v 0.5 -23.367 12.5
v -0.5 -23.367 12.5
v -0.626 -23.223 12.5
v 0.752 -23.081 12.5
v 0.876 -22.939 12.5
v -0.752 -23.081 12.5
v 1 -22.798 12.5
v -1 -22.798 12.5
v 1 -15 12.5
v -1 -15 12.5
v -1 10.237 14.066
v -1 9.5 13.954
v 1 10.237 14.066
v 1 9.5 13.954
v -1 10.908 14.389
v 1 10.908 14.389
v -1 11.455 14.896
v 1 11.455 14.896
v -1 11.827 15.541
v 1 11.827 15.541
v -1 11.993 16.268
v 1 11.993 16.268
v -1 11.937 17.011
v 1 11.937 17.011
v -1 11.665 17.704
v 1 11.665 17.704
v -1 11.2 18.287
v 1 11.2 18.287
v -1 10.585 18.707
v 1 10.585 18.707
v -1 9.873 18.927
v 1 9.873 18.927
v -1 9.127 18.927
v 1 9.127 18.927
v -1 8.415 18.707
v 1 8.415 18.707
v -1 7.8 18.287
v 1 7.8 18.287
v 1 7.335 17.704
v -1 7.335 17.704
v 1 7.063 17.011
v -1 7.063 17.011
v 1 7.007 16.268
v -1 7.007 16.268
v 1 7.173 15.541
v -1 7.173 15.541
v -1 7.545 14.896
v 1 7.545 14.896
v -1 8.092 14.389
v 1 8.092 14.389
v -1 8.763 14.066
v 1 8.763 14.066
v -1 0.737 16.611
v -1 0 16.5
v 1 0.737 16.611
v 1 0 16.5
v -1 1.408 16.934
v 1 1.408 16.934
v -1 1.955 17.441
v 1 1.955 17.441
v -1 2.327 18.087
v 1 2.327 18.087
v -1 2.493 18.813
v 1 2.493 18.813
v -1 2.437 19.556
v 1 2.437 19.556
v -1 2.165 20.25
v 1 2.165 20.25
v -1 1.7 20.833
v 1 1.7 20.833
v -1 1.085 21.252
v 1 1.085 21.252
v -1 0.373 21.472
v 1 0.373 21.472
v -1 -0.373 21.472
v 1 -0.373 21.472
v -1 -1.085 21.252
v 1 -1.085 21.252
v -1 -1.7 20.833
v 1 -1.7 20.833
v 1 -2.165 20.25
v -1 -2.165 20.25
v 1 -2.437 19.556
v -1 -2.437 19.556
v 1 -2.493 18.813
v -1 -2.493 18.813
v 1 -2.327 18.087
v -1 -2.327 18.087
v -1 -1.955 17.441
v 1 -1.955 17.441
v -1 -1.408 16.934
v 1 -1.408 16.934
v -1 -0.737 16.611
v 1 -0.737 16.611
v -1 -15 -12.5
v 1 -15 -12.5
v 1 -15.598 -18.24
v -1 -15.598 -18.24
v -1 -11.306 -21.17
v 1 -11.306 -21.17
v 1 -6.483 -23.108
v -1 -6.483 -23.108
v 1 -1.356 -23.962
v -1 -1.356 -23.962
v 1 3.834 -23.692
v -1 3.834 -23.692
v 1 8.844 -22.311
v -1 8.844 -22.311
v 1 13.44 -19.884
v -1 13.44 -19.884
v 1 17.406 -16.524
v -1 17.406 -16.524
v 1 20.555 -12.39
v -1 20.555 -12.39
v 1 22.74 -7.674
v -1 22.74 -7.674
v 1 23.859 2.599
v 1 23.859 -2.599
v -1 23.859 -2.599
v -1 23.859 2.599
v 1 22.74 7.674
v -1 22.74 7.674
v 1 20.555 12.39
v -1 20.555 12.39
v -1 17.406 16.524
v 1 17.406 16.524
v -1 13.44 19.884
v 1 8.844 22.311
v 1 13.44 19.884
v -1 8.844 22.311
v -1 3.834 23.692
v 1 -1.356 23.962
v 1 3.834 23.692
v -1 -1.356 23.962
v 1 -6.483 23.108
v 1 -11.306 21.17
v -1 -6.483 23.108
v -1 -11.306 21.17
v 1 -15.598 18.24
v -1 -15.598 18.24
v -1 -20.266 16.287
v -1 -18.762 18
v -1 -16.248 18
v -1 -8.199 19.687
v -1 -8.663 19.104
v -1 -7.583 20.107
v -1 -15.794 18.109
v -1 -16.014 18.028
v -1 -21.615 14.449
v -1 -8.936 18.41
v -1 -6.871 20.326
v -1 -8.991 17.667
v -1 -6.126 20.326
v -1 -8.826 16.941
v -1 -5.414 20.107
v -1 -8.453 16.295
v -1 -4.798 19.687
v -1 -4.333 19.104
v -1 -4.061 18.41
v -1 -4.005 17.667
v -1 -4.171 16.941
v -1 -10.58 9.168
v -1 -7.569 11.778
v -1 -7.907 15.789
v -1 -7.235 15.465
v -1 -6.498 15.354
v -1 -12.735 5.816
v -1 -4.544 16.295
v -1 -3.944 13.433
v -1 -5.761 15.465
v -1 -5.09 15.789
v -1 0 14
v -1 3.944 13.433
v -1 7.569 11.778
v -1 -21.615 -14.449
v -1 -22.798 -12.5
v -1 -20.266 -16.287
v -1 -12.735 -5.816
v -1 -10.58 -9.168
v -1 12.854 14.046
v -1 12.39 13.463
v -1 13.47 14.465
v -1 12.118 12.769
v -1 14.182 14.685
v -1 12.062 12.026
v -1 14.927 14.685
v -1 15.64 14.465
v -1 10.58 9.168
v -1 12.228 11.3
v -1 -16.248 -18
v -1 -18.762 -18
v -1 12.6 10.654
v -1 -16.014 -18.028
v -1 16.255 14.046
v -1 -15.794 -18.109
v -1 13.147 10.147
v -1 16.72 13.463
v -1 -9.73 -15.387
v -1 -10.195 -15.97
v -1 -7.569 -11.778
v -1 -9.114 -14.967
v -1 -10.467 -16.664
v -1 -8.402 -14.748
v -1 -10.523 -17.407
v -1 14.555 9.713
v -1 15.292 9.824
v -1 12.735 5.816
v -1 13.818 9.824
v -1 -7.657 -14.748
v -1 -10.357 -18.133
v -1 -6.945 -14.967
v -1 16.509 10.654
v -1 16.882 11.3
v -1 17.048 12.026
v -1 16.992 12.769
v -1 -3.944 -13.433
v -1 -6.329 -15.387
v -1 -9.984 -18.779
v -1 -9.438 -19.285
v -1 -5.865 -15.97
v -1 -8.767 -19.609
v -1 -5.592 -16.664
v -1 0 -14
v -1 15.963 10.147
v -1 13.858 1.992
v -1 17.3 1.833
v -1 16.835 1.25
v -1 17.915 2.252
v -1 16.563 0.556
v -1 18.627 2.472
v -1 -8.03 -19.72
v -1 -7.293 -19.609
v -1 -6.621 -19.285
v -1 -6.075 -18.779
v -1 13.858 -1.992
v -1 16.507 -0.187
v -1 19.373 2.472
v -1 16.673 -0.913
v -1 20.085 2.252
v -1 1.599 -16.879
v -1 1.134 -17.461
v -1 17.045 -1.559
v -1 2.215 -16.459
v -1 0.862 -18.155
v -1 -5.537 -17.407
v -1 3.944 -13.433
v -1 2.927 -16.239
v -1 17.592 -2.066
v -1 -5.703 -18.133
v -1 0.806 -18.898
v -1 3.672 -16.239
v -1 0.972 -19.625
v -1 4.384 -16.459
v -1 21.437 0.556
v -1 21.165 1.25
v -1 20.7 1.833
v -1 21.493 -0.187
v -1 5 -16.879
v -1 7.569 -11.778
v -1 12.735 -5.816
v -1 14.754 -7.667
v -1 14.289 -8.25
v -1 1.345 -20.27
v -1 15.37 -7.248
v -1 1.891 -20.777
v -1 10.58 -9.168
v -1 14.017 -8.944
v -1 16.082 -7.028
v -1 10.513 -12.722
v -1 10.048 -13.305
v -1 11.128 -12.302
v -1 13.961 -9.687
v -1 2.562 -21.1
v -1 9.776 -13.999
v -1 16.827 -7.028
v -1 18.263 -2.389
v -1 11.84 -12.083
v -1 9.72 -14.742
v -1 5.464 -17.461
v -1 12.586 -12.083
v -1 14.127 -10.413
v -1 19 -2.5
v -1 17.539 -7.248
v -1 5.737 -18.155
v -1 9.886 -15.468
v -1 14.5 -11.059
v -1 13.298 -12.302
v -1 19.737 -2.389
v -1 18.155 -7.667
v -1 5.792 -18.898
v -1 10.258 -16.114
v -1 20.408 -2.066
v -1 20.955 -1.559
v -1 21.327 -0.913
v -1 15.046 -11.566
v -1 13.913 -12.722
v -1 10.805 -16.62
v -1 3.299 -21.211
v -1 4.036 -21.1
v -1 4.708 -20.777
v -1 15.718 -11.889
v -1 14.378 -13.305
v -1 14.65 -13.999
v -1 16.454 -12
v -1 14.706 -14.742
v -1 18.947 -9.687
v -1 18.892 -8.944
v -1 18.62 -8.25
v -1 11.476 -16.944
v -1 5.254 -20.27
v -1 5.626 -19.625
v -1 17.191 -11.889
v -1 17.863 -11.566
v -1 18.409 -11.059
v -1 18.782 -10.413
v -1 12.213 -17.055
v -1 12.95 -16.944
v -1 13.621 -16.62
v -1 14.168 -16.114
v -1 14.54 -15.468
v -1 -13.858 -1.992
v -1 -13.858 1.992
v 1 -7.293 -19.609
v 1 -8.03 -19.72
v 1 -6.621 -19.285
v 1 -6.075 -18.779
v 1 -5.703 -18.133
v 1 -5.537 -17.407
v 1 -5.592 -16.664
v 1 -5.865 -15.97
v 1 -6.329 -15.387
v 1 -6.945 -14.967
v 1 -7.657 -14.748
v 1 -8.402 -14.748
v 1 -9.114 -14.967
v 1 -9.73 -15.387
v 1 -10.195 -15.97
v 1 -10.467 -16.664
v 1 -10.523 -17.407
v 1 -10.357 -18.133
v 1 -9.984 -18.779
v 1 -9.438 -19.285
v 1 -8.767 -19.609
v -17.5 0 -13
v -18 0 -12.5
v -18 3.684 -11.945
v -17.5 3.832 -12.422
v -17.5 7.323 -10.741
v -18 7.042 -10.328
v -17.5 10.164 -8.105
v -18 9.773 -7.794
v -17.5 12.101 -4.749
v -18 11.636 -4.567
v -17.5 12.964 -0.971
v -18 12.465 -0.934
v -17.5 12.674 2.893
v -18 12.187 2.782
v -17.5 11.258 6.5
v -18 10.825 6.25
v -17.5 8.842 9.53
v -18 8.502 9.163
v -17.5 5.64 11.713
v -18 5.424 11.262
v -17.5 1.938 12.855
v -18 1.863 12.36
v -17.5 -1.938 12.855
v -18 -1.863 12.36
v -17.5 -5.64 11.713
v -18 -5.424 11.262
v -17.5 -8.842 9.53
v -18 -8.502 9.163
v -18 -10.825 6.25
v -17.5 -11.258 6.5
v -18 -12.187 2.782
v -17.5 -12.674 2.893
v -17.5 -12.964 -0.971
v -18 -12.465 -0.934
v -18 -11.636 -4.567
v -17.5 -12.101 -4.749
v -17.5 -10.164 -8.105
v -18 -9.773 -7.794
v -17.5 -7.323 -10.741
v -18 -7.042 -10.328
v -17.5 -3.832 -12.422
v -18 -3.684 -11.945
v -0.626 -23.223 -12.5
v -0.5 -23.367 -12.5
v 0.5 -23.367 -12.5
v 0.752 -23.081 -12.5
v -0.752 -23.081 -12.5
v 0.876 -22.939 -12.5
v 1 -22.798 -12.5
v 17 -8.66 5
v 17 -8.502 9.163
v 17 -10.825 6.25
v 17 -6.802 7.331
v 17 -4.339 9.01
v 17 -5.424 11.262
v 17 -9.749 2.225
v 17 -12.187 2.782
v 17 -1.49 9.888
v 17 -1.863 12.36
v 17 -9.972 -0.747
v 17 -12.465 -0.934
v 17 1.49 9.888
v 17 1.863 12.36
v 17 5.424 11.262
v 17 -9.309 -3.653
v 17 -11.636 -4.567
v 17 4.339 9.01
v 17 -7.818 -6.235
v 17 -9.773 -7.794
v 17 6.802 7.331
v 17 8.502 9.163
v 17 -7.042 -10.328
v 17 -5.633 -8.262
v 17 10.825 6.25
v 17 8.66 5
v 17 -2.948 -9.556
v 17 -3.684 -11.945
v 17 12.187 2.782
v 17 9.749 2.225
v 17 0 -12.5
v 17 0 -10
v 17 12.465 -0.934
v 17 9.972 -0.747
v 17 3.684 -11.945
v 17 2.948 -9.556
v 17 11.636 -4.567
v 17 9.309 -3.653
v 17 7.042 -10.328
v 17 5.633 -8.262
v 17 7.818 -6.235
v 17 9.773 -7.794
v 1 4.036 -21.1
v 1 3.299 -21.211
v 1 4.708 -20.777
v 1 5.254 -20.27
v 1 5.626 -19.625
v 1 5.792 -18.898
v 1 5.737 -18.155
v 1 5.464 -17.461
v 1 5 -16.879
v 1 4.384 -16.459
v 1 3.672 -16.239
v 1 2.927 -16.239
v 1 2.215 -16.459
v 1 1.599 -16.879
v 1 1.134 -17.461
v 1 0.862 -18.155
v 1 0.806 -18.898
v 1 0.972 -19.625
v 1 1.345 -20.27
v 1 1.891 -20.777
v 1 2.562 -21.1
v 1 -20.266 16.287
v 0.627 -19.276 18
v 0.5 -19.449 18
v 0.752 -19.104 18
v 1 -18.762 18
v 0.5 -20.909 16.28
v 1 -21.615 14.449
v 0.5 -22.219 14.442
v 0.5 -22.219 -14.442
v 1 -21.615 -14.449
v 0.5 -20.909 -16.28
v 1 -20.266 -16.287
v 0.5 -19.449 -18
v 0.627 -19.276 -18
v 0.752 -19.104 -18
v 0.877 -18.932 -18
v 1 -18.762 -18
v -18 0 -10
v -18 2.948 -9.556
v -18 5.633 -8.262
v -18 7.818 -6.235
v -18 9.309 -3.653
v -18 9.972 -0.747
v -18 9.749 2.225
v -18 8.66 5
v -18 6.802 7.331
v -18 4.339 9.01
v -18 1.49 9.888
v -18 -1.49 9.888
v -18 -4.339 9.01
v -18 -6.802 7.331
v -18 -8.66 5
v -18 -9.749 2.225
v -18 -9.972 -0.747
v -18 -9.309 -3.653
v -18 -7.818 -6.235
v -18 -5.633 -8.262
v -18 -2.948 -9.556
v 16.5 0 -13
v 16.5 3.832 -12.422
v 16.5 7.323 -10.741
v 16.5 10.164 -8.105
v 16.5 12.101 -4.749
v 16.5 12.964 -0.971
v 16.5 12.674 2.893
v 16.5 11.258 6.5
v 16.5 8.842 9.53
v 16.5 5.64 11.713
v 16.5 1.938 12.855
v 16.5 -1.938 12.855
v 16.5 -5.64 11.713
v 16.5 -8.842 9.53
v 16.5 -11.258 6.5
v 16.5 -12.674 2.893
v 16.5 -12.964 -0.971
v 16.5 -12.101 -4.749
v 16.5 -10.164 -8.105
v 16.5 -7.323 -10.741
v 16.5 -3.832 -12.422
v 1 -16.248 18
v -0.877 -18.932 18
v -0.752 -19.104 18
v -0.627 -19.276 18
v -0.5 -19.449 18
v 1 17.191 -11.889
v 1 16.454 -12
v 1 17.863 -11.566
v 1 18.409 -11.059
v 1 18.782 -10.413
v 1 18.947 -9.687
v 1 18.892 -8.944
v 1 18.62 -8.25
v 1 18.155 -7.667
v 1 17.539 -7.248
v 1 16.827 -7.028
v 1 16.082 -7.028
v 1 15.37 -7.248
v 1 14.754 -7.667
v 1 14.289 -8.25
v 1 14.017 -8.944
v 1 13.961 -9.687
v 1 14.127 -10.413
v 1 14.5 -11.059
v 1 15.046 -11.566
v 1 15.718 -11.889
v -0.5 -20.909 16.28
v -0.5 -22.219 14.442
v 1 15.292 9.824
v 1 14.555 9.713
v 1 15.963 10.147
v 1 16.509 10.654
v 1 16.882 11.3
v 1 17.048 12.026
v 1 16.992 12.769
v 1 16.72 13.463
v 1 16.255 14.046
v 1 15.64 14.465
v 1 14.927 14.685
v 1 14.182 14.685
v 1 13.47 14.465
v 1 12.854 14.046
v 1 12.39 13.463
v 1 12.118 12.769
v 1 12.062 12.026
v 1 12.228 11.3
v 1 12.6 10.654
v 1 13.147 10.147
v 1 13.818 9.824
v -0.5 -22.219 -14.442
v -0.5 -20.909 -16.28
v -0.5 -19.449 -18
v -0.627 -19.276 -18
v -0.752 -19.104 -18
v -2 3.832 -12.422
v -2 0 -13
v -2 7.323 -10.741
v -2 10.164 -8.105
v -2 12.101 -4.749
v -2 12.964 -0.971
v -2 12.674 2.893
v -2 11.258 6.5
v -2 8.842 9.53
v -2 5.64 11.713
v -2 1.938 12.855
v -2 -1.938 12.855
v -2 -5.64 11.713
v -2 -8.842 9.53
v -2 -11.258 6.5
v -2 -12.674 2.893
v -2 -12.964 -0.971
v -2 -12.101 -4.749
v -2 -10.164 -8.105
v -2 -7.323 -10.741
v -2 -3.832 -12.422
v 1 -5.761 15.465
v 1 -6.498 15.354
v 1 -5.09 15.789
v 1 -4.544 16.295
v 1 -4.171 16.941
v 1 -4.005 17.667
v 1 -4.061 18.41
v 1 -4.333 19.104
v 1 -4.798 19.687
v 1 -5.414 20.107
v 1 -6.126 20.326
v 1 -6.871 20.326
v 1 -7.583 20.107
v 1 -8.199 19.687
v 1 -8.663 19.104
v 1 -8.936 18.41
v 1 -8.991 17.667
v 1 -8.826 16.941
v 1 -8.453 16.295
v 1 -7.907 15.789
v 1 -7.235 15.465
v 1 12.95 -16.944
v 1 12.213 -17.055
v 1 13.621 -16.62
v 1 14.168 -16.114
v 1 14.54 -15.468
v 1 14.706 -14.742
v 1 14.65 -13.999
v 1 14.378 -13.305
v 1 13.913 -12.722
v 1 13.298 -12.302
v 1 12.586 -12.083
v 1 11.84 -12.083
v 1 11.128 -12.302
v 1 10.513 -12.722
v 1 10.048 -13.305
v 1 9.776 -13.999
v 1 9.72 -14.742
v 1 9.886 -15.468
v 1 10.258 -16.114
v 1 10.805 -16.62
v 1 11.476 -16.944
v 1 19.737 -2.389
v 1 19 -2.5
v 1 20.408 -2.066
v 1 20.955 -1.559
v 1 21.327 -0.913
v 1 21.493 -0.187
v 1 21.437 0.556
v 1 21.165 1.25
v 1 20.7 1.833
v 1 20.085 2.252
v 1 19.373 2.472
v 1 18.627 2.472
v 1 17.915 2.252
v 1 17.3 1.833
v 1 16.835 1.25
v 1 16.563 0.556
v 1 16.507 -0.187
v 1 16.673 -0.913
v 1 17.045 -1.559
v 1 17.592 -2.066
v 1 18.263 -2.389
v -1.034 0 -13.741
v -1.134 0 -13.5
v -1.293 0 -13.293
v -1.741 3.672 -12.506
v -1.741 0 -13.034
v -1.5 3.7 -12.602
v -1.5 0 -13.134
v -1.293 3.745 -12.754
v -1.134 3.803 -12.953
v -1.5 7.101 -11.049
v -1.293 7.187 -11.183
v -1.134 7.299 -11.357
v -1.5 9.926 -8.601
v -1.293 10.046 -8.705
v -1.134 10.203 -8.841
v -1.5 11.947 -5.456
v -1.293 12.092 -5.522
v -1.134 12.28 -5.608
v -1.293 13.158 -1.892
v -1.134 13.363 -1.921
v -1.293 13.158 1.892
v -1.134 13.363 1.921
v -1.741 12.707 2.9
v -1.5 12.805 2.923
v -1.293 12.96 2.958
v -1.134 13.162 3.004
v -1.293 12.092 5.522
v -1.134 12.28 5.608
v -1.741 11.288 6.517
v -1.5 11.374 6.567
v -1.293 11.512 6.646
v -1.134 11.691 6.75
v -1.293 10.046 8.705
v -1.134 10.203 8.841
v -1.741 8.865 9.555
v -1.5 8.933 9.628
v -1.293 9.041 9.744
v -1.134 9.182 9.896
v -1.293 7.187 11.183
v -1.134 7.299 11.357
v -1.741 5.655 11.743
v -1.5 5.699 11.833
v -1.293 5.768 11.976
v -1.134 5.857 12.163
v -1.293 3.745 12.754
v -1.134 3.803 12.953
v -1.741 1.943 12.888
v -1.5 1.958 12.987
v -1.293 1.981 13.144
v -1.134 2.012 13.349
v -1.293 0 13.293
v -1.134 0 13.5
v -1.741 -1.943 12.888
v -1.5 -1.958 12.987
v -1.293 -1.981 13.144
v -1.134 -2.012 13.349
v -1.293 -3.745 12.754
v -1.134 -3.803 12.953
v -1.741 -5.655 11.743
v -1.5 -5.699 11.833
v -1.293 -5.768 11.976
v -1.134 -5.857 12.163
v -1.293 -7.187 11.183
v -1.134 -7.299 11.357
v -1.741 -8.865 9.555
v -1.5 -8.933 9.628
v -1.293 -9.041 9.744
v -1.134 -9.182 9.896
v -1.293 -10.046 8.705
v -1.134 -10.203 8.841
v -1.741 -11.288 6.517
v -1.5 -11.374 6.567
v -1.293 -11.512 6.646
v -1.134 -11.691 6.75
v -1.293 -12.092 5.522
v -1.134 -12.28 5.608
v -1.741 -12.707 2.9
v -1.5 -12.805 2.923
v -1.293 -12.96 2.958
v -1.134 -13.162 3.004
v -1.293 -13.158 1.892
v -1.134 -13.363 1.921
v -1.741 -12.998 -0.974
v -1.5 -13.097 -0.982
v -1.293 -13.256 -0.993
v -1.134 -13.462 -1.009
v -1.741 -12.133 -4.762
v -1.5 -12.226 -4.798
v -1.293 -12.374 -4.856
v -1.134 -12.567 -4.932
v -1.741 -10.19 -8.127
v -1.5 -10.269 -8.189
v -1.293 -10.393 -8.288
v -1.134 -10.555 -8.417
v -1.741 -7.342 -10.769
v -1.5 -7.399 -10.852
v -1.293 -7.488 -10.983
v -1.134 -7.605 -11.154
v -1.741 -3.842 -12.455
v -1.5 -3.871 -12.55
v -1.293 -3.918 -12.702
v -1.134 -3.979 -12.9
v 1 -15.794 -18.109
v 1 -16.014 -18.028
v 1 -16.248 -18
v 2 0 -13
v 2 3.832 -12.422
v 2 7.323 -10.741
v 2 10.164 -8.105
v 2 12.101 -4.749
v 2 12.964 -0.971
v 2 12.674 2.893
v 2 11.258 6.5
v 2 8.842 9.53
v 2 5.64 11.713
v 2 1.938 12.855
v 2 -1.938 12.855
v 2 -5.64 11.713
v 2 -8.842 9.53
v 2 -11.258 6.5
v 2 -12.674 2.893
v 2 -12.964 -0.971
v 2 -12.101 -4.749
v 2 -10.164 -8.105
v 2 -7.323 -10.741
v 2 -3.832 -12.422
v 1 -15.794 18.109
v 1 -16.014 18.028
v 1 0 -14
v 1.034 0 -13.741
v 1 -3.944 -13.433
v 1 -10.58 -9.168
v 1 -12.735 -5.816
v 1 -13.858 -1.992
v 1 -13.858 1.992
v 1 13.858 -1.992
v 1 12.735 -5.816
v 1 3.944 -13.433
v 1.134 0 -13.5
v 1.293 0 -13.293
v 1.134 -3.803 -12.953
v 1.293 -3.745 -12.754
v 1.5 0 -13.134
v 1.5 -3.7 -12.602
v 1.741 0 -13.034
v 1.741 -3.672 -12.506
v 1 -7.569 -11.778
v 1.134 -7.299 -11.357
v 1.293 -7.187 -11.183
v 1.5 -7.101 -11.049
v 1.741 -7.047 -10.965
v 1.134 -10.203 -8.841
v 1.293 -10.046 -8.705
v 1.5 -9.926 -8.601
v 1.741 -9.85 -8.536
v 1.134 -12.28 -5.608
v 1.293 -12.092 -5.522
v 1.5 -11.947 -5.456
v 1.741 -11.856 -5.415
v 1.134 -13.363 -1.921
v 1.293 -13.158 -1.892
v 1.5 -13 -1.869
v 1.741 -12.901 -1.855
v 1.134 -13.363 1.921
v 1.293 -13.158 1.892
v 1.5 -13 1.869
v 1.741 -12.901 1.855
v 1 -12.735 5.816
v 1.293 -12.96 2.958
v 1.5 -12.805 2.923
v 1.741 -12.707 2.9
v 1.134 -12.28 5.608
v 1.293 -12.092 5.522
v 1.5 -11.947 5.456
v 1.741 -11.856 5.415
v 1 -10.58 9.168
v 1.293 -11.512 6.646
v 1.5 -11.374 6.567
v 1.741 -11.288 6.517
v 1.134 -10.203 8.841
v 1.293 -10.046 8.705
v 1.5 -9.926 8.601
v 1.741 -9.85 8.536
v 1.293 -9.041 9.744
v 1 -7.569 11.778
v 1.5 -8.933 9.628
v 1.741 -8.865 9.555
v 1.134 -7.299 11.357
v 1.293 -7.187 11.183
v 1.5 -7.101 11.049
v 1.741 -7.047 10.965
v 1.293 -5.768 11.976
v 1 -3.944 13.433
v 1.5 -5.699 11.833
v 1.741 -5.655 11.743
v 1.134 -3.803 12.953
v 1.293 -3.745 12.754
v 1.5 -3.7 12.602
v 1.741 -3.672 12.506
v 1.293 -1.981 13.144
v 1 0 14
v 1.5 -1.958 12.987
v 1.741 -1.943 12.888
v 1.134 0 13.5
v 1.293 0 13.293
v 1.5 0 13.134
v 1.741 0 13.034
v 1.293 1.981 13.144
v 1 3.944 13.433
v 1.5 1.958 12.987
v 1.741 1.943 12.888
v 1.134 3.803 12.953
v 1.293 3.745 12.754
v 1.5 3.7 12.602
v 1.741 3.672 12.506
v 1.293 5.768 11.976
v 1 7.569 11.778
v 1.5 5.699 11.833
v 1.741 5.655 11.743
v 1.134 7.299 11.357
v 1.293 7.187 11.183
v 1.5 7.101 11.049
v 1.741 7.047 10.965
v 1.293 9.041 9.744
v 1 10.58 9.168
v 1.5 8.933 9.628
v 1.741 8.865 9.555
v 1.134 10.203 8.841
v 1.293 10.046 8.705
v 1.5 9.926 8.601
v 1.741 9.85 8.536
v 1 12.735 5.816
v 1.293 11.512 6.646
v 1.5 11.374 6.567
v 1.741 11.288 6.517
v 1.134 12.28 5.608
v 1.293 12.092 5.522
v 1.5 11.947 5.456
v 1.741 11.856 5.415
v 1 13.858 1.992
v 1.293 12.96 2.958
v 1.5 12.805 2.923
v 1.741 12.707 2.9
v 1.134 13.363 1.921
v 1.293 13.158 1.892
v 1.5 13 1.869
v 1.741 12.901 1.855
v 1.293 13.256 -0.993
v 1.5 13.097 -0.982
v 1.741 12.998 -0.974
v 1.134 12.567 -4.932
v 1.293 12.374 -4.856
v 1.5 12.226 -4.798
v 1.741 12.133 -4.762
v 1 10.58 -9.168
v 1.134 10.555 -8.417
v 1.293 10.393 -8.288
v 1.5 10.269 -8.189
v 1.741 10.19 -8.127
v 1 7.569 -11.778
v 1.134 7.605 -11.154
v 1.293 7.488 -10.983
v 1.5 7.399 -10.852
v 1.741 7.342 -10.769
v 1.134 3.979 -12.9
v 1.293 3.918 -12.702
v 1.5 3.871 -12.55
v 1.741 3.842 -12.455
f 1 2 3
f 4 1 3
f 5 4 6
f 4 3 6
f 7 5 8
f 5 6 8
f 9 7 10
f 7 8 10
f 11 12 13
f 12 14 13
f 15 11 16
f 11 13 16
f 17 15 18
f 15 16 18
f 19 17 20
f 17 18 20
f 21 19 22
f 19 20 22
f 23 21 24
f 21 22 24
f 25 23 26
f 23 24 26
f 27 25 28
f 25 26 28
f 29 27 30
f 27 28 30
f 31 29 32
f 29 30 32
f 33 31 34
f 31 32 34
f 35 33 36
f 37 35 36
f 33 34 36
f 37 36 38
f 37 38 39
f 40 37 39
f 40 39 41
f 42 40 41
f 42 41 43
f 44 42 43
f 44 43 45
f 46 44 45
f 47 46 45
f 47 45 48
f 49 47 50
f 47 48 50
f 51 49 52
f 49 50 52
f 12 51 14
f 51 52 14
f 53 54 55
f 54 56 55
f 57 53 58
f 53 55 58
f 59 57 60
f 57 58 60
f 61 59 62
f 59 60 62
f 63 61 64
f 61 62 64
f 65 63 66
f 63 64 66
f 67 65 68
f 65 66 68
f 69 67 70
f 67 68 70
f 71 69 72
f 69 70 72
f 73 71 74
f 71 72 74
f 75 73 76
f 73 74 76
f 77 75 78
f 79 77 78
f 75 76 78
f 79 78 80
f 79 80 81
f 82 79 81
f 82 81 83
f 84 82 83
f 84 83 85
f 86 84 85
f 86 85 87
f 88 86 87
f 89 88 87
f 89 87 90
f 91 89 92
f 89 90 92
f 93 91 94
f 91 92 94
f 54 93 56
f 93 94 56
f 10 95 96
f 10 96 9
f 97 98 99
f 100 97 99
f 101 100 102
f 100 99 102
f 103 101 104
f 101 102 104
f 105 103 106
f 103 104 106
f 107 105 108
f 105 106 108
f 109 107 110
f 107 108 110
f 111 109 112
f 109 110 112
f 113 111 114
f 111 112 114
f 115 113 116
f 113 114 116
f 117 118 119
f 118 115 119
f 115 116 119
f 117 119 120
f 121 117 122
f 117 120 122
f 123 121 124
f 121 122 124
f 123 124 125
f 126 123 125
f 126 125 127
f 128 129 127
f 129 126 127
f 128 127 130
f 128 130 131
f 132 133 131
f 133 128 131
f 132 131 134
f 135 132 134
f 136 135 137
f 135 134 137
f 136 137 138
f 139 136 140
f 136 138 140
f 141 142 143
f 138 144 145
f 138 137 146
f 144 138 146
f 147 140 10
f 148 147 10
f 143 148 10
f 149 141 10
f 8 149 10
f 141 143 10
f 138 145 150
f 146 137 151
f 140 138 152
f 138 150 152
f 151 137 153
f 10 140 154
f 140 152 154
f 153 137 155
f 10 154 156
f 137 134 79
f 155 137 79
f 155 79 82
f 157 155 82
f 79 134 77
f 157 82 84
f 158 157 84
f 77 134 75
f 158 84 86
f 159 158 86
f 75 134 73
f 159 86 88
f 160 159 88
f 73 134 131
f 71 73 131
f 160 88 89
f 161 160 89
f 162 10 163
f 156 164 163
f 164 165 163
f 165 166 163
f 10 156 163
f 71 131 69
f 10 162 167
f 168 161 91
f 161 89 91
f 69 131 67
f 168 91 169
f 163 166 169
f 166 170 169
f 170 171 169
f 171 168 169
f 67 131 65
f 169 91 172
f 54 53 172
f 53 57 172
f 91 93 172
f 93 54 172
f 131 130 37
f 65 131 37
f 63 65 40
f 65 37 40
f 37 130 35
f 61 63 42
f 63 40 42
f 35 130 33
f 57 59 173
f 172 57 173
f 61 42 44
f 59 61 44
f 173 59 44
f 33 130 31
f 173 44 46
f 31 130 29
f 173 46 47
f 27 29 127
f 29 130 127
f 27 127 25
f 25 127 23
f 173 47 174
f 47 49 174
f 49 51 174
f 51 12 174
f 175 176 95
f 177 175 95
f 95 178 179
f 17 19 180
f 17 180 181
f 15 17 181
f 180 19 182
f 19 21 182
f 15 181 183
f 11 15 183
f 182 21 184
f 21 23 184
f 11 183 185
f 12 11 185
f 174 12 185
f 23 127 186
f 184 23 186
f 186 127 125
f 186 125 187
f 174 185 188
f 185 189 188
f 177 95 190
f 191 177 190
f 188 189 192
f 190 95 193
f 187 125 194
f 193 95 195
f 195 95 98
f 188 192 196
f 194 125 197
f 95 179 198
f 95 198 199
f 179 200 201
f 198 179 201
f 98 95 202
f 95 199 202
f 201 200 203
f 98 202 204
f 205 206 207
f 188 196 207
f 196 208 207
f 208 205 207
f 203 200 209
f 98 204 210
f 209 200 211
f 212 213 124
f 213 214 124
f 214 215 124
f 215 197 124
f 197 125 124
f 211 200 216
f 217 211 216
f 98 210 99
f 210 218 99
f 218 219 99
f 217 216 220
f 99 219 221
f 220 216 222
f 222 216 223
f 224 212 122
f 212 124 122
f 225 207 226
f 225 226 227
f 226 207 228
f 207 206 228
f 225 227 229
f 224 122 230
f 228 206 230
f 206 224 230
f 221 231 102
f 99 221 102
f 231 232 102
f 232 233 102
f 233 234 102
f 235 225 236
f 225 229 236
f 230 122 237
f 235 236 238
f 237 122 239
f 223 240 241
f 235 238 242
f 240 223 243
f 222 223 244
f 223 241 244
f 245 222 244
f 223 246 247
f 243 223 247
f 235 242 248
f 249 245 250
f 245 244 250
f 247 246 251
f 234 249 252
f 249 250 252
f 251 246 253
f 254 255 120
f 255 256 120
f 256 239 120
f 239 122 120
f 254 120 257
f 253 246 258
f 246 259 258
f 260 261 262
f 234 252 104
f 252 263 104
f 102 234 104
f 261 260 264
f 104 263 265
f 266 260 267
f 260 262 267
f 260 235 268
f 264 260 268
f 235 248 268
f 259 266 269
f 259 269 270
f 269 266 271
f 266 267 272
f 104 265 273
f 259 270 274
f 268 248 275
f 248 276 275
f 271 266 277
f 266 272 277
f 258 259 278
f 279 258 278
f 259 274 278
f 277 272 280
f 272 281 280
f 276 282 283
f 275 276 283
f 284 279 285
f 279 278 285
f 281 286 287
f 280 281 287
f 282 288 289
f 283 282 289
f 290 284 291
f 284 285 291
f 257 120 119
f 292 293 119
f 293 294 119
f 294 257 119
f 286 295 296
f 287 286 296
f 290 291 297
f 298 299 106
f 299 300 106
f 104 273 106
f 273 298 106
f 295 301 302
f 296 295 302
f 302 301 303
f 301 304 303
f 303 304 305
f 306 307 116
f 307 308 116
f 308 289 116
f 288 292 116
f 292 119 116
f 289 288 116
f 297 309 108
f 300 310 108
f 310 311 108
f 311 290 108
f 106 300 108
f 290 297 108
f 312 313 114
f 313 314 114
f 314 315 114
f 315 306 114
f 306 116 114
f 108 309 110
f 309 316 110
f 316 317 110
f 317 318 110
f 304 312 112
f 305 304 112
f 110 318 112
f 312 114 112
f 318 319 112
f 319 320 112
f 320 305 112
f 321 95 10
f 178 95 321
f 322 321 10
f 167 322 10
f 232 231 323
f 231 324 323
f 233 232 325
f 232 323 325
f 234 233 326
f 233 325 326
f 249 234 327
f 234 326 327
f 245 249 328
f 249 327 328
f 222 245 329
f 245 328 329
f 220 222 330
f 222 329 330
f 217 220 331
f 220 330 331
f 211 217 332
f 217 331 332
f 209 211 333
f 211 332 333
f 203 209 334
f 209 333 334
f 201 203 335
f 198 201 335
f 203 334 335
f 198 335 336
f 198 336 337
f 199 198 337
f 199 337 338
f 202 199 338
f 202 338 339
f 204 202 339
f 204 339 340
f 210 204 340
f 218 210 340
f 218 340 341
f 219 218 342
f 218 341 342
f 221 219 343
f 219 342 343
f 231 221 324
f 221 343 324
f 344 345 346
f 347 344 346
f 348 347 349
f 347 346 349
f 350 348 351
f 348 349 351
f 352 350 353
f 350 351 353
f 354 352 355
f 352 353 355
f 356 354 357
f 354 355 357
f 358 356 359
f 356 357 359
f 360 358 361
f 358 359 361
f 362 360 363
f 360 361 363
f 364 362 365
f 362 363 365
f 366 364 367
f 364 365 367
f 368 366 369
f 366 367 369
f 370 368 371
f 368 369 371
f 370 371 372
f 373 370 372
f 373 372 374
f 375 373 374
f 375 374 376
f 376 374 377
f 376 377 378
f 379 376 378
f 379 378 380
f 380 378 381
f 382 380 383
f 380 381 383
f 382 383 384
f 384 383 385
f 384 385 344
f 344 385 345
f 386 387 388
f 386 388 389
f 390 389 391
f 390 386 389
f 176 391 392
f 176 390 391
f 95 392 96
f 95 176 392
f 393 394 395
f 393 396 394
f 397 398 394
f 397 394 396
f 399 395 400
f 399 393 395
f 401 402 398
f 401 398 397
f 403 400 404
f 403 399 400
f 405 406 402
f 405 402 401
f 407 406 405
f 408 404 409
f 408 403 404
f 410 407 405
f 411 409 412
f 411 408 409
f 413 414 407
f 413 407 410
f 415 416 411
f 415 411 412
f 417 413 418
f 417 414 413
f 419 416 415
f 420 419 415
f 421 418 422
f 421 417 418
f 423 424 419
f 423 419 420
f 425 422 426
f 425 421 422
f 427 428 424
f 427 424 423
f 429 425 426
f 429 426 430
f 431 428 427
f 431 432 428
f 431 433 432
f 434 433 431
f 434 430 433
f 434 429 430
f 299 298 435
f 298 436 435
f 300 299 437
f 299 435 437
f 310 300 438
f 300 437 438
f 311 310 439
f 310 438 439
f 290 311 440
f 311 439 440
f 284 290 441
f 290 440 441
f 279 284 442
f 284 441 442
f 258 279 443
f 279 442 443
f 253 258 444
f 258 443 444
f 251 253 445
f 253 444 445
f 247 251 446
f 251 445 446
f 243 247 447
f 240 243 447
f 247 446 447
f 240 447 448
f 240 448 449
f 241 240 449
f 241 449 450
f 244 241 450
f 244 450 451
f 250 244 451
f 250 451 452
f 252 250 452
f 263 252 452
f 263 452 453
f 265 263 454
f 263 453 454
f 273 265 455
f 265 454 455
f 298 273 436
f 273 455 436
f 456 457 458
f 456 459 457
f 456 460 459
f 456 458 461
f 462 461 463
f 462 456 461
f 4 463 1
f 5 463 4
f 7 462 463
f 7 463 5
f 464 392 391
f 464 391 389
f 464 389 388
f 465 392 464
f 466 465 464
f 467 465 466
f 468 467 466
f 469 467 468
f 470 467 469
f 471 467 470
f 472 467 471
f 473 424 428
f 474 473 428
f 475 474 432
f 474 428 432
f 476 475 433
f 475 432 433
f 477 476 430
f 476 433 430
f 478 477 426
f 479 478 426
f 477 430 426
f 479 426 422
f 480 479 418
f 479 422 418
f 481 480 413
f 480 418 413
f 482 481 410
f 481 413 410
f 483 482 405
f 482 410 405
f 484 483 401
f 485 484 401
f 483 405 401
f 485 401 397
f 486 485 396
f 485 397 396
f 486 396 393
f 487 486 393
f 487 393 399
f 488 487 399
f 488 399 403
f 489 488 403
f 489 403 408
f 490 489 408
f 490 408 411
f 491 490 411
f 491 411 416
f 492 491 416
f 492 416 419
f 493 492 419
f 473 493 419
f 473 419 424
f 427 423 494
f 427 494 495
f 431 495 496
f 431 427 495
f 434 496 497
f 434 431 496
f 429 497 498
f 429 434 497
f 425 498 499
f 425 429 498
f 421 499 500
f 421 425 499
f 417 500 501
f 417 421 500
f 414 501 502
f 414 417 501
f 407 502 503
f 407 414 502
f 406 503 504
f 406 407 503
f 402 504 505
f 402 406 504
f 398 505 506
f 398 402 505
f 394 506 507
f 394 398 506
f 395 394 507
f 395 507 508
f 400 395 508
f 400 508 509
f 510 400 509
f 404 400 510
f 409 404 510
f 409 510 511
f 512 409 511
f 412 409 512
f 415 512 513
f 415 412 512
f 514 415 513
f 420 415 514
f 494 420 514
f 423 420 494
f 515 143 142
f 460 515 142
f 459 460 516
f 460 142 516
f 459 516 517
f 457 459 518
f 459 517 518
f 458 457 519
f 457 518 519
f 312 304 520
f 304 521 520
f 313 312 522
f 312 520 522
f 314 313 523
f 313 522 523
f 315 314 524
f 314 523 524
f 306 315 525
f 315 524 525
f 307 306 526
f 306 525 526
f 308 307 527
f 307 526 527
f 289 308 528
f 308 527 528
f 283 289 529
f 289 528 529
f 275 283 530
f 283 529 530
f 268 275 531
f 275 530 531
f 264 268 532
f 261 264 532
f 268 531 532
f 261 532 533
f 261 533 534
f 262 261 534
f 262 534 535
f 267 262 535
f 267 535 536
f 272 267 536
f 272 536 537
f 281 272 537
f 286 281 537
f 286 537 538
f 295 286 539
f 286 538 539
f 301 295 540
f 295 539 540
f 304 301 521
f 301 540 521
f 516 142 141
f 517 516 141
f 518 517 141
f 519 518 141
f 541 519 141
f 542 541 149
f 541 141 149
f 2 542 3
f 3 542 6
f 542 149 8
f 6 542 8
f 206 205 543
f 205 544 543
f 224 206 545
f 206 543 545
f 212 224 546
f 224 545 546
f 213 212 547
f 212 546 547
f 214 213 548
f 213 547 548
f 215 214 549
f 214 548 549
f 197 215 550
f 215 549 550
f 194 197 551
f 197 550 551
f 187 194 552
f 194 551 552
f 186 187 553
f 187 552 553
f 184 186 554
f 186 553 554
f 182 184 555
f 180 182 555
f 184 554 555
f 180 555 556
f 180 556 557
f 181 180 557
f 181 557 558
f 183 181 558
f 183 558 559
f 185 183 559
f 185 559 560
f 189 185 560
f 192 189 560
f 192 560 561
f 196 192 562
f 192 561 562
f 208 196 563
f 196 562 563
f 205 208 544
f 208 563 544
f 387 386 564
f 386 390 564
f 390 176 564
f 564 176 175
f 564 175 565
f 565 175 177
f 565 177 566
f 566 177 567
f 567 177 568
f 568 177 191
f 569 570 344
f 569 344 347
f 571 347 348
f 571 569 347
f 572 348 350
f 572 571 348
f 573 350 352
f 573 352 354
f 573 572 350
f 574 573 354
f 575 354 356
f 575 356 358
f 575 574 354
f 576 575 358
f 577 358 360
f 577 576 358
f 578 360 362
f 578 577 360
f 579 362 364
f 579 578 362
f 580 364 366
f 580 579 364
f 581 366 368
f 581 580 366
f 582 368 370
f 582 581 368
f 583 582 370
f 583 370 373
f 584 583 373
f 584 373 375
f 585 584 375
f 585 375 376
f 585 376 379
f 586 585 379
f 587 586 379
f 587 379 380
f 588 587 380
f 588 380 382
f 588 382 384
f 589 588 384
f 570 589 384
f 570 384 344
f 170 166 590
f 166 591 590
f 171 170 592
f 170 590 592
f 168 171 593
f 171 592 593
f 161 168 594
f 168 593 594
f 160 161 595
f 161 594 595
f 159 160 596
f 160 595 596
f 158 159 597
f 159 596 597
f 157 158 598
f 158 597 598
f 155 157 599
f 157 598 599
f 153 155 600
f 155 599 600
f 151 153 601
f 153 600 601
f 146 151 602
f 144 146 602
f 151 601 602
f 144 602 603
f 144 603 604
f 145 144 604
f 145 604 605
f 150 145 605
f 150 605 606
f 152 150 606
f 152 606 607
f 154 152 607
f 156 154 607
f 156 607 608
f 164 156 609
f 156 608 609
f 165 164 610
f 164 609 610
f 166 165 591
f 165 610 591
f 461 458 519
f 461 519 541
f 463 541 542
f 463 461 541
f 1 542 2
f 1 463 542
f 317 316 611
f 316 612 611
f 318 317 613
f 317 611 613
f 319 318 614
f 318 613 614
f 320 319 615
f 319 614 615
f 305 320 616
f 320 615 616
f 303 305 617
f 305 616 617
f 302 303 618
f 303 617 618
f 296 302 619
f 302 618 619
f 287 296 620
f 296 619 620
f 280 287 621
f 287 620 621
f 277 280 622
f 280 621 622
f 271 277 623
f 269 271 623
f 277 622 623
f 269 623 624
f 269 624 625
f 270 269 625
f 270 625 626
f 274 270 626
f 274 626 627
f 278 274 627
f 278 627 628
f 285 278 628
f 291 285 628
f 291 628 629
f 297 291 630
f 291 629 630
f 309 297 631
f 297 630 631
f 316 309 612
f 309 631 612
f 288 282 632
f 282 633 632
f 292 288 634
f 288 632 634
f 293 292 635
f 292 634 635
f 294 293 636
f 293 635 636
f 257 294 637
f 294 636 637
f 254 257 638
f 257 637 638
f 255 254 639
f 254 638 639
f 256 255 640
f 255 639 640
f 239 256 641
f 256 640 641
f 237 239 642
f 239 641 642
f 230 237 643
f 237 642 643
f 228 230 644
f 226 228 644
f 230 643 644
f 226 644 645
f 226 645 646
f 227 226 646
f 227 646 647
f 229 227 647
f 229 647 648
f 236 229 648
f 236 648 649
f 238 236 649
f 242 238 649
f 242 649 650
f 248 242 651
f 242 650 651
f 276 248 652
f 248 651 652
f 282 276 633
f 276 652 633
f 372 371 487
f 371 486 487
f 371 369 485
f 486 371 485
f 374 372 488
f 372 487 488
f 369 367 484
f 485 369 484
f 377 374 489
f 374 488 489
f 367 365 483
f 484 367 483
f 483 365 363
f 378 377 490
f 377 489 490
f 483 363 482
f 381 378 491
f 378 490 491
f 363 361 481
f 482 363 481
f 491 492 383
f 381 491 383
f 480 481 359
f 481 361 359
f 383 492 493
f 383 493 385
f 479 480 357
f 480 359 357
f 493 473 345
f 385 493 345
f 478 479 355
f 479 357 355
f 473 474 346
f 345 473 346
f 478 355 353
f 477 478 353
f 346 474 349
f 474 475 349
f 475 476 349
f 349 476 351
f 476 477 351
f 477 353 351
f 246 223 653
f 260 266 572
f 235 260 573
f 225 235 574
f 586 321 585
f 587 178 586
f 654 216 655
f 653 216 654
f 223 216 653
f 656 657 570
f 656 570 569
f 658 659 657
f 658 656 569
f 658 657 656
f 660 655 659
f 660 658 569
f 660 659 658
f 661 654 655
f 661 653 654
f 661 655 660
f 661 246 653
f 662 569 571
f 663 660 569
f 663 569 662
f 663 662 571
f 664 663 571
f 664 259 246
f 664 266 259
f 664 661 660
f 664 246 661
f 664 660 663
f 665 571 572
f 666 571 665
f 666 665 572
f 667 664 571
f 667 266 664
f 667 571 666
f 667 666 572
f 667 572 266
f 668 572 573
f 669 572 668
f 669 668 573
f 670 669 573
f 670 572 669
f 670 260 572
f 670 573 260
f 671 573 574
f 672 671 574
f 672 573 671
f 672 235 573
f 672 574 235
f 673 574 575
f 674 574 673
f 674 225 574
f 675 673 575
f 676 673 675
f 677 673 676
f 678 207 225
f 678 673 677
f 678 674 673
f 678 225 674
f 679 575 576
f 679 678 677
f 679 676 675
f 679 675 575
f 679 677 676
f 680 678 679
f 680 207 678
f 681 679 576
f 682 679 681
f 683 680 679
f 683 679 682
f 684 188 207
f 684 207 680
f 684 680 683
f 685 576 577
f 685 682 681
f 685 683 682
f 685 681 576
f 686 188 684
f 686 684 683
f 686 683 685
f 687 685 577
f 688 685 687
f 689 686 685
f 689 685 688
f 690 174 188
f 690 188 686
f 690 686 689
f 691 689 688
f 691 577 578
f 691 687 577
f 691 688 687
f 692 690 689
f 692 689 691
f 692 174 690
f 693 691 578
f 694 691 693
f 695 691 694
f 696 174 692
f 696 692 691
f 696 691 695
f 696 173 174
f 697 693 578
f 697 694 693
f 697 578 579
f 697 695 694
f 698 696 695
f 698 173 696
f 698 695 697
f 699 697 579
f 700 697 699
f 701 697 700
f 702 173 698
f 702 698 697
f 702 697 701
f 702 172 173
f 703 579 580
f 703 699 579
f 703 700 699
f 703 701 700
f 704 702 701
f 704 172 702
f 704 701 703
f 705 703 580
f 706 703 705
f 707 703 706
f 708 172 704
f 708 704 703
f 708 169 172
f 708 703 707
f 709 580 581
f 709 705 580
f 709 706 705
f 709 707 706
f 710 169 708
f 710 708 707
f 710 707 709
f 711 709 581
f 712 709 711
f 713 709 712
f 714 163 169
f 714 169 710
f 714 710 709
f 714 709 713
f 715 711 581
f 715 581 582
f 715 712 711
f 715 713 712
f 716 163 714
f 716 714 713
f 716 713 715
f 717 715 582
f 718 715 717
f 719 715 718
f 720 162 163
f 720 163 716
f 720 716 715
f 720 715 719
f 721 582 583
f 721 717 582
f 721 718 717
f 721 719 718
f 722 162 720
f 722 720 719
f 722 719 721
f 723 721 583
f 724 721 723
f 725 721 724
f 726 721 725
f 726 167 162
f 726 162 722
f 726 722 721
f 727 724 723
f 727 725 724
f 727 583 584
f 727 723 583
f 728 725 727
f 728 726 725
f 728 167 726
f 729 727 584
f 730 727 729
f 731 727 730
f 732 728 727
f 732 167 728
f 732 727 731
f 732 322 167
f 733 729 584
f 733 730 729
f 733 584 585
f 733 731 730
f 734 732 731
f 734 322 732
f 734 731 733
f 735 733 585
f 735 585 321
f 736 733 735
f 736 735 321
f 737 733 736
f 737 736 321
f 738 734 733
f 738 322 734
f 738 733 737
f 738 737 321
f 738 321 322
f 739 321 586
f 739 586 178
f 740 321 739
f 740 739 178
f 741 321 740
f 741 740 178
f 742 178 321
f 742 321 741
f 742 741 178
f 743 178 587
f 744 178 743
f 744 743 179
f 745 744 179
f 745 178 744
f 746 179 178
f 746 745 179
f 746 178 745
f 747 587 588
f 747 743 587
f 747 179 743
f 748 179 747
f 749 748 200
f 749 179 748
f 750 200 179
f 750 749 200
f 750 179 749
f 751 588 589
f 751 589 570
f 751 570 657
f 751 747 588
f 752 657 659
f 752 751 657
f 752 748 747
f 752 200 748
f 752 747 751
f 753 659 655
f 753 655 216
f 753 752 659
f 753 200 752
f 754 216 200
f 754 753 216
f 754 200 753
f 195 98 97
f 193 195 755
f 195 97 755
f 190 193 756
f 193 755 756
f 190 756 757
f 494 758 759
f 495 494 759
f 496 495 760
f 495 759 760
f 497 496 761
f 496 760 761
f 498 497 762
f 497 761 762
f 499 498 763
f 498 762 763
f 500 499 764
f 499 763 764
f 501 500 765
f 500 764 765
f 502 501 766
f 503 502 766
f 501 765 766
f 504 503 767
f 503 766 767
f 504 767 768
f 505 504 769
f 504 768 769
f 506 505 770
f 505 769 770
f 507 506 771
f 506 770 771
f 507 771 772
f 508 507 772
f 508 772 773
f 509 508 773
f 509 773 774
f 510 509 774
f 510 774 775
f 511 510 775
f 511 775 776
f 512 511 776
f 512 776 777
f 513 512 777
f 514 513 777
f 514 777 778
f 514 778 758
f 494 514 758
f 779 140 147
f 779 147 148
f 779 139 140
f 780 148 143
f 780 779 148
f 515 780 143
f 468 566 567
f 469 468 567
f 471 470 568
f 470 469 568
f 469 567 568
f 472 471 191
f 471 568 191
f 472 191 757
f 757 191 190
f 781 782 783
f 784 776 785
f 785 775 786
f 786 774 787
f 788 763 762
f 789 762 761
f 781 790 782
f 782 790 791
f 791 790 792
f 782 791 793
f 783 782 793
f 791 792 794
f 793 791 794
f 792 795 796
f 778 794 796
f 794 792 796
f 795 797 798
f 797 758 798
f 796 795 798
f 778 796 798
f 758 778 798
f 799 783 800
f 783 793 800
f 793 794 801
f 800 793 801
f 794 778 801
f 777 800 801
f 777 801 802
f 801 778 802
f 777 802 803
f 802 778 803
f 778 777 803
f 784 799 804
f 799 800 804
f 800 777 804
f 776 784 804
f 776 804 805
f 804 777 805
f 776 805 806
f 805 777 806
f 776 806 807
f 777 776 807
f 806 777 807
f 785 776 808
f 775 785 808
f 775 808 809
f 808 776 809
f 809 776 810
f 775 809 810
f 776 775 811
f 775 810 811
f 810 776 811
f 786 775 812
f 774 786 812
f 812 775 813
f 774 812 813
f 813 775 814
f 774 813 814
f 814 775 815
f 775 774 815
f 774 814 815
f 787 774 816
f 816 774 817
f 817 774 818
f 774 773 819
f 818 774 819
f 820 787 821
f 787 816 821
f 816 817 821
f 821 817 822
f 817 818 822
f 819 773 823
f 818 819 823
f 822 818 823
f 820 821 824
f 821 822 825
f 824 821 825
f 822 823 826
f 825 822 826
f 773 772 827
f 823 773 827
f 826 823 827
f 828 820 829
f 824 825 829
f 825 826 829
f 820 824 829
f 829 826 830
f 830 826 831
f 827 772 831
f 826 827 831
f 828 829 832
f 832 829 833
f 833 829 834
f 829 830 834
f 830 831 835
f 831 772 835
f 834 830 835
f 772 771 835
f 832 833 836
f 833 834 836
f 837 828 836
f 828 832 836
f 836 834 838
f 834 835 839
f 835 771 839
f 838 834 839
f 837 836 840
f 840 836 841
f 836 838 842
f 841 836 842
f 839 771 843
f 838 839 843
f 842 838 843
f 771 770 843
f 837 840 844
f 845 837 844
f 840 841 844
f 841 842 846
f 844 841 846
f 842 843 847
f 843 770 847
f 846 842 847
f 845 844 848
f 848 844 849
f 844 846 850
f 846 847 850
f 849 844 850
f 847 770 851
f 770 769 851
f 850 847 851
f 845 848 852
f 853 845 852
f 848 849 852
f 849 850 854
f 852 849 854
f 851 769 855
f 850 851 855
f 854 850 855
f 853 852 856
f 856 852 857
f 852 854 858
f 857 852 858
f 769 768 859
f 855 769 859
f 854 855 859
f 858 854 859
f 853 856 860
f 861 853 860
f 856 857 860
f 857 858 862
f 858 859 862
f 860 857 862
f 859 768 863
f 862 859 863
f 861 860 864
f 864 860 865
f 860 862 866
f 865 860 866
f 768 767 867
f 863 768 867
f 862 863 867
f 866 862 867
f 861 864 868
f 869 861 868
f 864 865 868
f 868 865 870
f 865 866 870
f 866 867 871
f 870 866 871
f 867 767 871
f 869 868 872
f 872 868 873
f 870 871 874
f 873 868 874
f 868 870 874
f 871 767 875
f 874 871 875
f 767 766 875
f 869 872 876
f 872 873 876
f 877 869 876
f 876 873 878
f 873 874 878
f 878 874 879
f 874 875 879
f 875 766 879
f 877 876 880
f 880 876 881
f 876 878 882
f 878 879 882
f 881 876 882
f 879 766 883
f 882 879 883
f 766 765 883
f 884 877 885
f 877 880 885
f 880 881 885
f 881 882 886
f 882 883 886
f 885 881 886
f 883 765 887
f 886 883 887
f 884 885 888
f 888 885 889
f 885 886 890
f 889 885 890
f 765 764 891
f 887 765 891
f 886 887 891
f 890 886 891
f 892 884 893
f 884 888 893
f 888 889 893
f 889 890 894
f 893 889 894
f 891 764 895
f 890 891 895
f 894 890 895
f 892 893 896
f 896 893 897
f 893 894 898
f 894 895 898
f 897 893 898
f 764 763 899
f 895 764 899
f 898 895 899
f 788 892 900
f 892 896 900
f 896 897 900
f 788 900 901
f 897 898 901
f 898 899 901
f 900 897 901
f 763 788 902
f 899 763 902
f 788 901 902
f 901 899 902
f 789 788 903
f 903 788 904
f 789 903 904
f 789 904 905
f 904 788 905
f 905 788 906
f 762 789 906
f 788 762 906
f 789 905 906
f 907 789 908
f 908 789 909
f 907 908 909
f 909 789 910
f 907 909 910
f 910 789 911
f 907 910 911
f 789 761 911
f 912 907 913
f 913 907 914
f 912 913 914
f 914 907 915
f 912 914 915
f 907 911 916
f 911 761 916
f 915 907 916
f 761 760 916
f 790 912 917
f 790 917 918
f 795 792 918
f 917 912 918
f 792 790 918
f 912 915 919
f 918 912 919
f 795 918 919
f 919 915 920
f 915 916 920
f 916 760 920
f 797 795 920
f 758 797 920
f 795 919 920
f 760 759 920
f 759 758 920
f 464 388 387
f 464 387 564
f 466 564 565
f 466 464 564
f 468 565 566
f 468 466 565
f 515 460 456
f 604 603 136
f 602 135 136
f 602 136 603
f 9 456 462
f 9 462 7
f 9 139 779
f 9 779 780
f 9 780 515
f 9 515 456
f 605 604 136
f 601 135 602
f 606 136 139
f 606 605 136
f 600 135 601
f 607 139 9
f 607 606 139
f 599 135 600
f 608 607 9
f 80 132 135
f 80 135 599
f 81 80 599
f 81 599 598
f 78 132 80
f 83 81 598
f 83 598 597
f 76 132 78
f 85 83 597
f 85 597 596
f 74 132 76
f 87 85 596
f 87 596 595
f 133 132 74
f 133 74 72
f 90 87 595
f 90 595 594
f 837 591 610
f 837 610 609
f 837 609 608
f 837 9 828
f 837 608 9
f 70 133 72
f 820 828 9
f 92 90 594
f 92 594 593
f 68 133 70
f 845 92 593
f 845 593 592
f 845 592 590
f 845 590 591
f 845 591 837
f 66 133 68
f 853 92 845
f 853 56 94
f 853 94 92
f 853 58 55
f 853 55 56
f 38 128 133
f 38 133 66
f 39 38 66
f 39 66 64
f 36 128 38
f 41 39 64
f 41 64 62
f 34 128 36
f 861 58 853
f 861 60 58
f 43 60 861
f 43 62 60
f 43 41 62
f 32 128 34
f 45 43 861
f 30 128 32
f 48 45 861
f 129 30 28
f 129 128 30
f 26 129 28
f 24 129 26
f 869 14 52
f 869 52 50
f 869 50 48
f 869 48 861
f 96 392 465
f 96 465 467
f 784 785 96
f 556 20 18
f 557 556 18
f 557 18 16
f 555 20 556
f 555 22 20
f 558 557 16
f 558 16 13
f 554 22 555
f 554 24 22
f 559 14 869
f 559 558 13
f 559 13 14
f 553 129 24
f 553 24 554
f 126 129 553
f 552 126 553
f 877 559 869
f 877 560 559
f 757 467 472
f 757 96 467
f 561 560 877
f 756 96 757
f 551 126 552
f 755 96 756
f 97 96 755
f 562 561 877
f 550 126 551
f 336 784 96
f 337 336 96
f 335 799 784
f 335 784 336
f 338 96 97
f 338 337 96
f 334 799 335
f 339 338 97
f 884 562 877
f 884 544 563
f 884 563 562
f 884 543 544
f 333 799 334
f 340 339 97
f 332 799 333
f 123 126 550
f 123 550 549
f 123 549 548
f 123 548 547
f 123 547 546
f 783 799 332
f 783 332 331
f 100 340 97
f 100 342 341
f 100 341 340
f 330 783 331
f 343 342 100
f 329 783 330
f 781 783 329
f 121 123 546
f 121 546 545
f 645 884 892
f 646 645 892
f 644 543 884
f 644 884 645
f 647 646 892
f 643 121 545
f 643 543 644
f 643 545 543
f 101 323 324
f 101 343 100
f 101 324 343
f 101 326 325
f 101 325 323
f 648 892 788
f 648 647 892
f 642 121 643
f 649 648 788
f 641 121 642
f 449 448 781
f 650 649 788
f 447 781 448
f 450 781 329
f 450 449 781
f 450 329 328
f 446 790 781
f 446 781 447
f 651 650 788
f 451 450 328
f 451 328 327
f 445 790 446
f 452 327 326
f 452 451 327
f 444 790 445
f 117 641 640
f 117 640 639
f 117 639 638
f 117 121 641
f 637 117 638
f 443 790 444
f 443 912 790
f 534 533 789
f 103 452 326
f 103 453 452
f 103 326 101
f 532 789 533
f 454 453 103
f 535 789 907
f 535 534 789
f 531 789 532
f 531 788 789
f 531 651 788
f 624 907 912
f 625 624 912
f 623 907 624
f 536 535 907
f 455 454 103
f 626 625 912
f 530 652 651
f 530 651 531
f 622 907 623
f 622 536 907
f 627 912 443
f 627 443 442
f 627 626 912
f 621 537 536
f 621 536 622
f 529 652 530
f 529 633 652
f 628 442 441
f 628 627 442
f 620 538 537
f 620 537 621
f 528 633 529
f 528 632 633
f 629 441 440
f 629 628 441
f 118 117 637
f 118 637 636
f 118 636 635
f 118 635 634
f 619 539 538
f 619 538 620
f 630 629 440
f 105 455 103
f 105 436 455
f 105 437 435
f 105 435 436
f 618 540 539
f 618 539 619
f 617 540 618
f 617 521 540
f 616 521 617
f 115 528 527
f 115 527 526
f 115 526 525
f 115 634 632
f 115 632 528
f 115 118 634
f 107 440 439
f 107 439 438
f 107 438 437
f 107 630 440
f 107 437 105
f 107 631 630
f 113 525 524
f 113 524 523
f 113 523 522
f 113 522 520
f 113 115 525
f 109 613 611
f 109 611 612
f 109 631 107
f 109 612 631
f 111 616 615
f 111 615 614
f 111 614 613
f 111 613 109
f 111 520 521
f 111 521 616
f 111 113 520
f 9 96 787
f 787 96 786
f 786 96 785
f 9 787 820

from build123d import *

# Parameters (mm, degrees)
SKETCH1_R                       = 13
BOSS_EXTRUDE1_DEPTH             = 17
SKETCH2_R                       = 26.5
BOSS_EXTRUDE2_DEPTH             = 1
CHAMFER1_SIZE                   = 0.5
SKETCH4_R                       = 2.5
WYTNIJ_WYCI_GNI_CIE1_DEPTH      = 18
WYTNIJ_WYCI_GNI_CIE1_DEPTH_BACK = 2
SKETCH1_3_R                     = 13
DODANIE_WYCI_GNI_CIE1_DEPTH     = 18
SZKIC5_R                        = 10
WYTNIJ_WYCI_GNI_CIE2_DEPTH      = 40
WYTNIJ_WYCI_GNI_CIE3_DEPTH      = 40
SFAZOWANIE1_SIZE                = 0.5
ZAOKR_GLENIE1_R                 = 1
SZKIC7_W                        = 25
SZKIC7_H                        = 18.250813048
WYTNIJ_WYCI_GNI_CIE4_DEPTH      = 10
ZAOKR_GLENIE2_R                 = 1


with BuildPart() as part:
    # Sketch1 → Boss-Extrude1 (new body)
    with BuildSketch(Plane(origin=(0, 0, 0), x_dir=(0, 0, -1), z_dir=(1, 0, 0))):
        Circle(SKETCH1_R)
    extrude(amount=BOSS_EXTRUDE1_DEPTH)

    # Sketch2 → Boss-Extrude2 (add, symmetric)
    with BuildSketch(Plane(origin=(0, 0, 0), x_dir=(0, 0, -1), z_dir=(1, 0, 0))):
        Circle(SKETCH2_R)
    extrude(amount=BOSS_EXTRUDE2_DEPTH, both=True)

    # Chamfer1
    chamfer1_edges = [part.edges().sort_by_distance(p)[0] for p in [
        (17, 0, 13),
        (-1, 0, 26.5),
        (1, 0, 26.5),
    ]]
    chamfer(chamfer1_edges, length=CHAMFER1_SIZE)

    # Sketch4 → Wytnij-wyci_gni_cie1 (cut, two sides)
    with BuildSketch(Plane(origin=(0, 0, 0), x_dir=(0, 0, -1), z_dir=(1, 0, 0))) as wytnij_wyci_gni_cie1_sk:
        with Locations((17.219847954, -8.029746973)):
            Circle(SKETCH4_R)
        with Locations((-19, 0)):
            Circle(SKETCH4_R)
        with Locations((14.554844419, 12.212964584)):
            Circle(SKETCH4_R)
        with Locations((0, 19)):
            Circle(SKETCH4_R)
        with Locations((-17.854159795, -6.498382723)):
            Circle(SKETCH4_R)
        with Locations((-16.454482672, 9.5)):
            Circle(SKETCH4_R)
        with Locations((18.711347307, 3.299315376)):
            Circle(SKETCH4_R)
        with Locations((-12.212964584, 14.554844419)):
            Circle(SKETCH4_R)
        with Locations((9.5, 16.454482672)):
            Circle(SKETCH4_R)
    extrude(amount=WYTNIJ_WYCI_GNI_CIE1_DEPTH, mode=Mode.SUBTRACT)
    extrude(wytnij_wyci_gni_cie1_sk.sketch, amount=-WYTNIJ_WYCI_GNI_CIE1_DEPTH_BACK, mode=Mode.SUBTRACT)

    # Sketch1_3 → Dodanie-wyci_gni_cie1 (add)
    with BuildSketch(Plane(origin=(0, 0, 0), x_dir=(0, 0, -1), z_dir=(1, 0, 0))):
        Circle(SKETCH1_3_R)
    extrude(amount=-DODANIE_WYCI_GNI_CIE1_DEPTH)

    # Szkic5 → Wytnij-wyci_gni_cie2 (cut)
    with BuildSketch(Plane(origin=(17, 0, 0), x_dir=(0, 0, -1), z_dir=(1, 0, 0))):
        Circle(SZKIC5_R)
    extrude(amount=-WYTNIJ_WYCI_GNI_CIE2_DEPTH, mode=Mode.SUBTRACT)

    # Szkic4 → Wytnij-wyci_gni_cie3 (cut)
    with BuildSketch(Plane.ZY.offset(1)):
        with BuildLine():
            Line((18, -15.874507866), (18, -28.40570104))
            Line((18, -28.40570104), (34.562586152, -28.40570104))
            Line((34.562586152, -28.40570104), (34.562586152, 27.915934969))
            Line((34.562586152, 27.915934969), (-37.904902175, 28.979399158))
            Line((-37.904902175, 28.979399158), (-37.904902175, -27.460164602))
            Line((-37.904902175, -27.460164602), (-18, -25.464511286))
            Line((-18, -25.464511286), (-18, -15.874507866))
            ThreePointArc((-18, -15.874507866), (0, 24), (18, -15.874507866))
        make_face()
    extrude(amount=-WYTNIJ_WYCI_GNI_CIE3_DEPTH, mode=Mode.SUBTRACT)

    # Sfazowanie1
    sfazowanie1_edges = [part.edges().sort_by_distance(p)[0] for p in [
        (-18, 0, 13),
    ]]
    chamfer(sfazowanie1_edges, length=SFAZOWANIE1_SIZE)

    # Zaokr_glenie1
    zaokr_glenie1_edges = [part.edges().sort_by_distance(p)[0] for p in [
        (-1, 0, 13),
        (1, 0, 13),
    ]]
    fillet(zaokr_glenie1_edges, radius=ZAOKR_GLENIE1_R)

    # Szkic7 → Wytnij-wyci_gni_cie4 (cut)
    with BuildSketch(Plane.ZY.offset(1)):
        with Locations((0, -24.125406524)):
            Rectangle(SZKIC7_W, SZKIC7_H)
    extrude(amount=-WYTNIJ_WYCI_GNI_CIE4_DEPTH, mode=Mode.SUBTRACT)

    # Zaokr_glenie2
    zaokr_glenie2_edges = [part.edges().sort_by_distance(p)[0] for p in [
        (0, -15.874507866, 18),
        (0, -15.874507866, -18),
    ]]
    fillet(zaokr_glenie2_edges, radius=ZAOKR_GLENIE2_R)


solid = part.part
